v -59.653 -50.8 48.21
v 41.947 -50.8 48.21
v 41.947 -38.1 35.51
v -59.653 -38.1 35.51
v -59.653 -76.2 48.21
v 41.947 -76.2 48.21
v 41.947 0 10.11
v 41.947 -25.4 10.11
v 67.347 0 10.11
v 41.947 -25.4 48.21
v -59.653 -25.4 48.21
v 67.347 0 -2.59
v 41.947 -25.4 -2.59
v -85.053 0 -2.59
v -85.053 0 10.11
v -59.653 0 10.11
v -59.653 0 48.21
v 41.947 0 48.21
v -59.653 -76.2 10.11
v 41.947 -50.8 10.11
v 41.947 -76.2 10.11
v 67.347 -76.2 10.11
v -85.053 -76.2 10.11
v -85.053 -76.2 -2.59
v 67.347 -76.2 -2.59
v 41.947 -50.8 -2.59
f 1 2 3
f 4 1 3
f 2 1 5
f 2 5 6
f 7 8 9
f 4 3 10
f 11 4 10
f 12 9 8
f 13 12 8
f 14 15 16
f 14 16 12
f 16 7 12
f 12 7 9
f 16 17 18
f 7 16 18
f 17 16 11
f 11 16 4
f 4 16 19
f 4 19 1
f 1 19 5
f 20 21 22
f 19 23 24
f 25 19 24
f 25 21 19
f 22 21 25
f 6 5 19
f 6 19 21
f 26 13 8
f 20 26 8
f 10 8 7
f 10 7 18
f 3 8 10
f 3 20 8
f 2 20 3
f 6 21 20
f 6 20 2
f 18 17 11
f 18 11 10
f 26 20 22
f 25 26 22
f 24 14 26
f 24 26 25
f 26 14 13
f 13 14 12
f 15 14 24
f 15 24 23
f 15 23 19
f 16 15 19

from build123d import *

# Parameters (mm, degrees)
F1_W      = 152.4
F1_H      = 50.8
F2_DEPTH  = 76.2
F3_W      = 25.4
F3_H      = 38.1
F4_DEPTH  = 76.201
F5_W      = 25.4
F5_H      = 38.1
F6_DEPTH  = 76.201
F9_DEPTH  = 12.701
F11_DEPTH = 127.001


with BuildPart() as f2:
    # F1 (on face) → F2 (new body)
    with BuildSketch(Plane.XZ):
        with Locations((-8.853449, 22.809748)):
            Rectangle(F1_W, F1_H)
    extrude(amount=F2_DEPTH)

    # F3 (on face) → F4 (cut, through all)
    with BuildSketch(Plane.XZ.offset(76.2)):
        with Locations((-72.353449, 29.159748)):
            Rectangle(F3_W, F3_H)
    extrude(amount=-F4_DEPTH, mode=Mode.SUBTRACT)

    # F5 (on face) → F6 (cut, through all)
    with BuildSketch(Plane.XZ.offset(76.2)):
        with Locations((54.646551, 29.159748)):
            Rectangle(F5_W, F5_H)
    extrude(amount=-F6_DEPTH, mode=Mode.SUBTRACT)

    # F8 (on face) → F9 (cut, through all)
    with BuildSketch(Plane.XY.offset(10.109748)):
        Polygon((41.946551, -50.8), (67.346551, -76.2), (67.346551, 0), (41.946551, -25.4), align=None)
        Polygon((67.346551, 0), (67.346551, -76.2), (78.186899, -95.031939), (78.186899, -19.507643), align=None)
    extrude(amount=-F9_DEPTH, mode=Mode.SUBTRACT)

    # F10 (on face) → F11 (cut, through all)
    with BuildSketch(Plane.YZ.offset(41.946551)):
        Polygon((-25.4, 48.209748), (-50.8, 48.209748), (-38.1, 35.509748), align=None)
    extrude(amount=-F11_DEPTH, mode=Mode.SUBTRACT)


solid = f2.part
